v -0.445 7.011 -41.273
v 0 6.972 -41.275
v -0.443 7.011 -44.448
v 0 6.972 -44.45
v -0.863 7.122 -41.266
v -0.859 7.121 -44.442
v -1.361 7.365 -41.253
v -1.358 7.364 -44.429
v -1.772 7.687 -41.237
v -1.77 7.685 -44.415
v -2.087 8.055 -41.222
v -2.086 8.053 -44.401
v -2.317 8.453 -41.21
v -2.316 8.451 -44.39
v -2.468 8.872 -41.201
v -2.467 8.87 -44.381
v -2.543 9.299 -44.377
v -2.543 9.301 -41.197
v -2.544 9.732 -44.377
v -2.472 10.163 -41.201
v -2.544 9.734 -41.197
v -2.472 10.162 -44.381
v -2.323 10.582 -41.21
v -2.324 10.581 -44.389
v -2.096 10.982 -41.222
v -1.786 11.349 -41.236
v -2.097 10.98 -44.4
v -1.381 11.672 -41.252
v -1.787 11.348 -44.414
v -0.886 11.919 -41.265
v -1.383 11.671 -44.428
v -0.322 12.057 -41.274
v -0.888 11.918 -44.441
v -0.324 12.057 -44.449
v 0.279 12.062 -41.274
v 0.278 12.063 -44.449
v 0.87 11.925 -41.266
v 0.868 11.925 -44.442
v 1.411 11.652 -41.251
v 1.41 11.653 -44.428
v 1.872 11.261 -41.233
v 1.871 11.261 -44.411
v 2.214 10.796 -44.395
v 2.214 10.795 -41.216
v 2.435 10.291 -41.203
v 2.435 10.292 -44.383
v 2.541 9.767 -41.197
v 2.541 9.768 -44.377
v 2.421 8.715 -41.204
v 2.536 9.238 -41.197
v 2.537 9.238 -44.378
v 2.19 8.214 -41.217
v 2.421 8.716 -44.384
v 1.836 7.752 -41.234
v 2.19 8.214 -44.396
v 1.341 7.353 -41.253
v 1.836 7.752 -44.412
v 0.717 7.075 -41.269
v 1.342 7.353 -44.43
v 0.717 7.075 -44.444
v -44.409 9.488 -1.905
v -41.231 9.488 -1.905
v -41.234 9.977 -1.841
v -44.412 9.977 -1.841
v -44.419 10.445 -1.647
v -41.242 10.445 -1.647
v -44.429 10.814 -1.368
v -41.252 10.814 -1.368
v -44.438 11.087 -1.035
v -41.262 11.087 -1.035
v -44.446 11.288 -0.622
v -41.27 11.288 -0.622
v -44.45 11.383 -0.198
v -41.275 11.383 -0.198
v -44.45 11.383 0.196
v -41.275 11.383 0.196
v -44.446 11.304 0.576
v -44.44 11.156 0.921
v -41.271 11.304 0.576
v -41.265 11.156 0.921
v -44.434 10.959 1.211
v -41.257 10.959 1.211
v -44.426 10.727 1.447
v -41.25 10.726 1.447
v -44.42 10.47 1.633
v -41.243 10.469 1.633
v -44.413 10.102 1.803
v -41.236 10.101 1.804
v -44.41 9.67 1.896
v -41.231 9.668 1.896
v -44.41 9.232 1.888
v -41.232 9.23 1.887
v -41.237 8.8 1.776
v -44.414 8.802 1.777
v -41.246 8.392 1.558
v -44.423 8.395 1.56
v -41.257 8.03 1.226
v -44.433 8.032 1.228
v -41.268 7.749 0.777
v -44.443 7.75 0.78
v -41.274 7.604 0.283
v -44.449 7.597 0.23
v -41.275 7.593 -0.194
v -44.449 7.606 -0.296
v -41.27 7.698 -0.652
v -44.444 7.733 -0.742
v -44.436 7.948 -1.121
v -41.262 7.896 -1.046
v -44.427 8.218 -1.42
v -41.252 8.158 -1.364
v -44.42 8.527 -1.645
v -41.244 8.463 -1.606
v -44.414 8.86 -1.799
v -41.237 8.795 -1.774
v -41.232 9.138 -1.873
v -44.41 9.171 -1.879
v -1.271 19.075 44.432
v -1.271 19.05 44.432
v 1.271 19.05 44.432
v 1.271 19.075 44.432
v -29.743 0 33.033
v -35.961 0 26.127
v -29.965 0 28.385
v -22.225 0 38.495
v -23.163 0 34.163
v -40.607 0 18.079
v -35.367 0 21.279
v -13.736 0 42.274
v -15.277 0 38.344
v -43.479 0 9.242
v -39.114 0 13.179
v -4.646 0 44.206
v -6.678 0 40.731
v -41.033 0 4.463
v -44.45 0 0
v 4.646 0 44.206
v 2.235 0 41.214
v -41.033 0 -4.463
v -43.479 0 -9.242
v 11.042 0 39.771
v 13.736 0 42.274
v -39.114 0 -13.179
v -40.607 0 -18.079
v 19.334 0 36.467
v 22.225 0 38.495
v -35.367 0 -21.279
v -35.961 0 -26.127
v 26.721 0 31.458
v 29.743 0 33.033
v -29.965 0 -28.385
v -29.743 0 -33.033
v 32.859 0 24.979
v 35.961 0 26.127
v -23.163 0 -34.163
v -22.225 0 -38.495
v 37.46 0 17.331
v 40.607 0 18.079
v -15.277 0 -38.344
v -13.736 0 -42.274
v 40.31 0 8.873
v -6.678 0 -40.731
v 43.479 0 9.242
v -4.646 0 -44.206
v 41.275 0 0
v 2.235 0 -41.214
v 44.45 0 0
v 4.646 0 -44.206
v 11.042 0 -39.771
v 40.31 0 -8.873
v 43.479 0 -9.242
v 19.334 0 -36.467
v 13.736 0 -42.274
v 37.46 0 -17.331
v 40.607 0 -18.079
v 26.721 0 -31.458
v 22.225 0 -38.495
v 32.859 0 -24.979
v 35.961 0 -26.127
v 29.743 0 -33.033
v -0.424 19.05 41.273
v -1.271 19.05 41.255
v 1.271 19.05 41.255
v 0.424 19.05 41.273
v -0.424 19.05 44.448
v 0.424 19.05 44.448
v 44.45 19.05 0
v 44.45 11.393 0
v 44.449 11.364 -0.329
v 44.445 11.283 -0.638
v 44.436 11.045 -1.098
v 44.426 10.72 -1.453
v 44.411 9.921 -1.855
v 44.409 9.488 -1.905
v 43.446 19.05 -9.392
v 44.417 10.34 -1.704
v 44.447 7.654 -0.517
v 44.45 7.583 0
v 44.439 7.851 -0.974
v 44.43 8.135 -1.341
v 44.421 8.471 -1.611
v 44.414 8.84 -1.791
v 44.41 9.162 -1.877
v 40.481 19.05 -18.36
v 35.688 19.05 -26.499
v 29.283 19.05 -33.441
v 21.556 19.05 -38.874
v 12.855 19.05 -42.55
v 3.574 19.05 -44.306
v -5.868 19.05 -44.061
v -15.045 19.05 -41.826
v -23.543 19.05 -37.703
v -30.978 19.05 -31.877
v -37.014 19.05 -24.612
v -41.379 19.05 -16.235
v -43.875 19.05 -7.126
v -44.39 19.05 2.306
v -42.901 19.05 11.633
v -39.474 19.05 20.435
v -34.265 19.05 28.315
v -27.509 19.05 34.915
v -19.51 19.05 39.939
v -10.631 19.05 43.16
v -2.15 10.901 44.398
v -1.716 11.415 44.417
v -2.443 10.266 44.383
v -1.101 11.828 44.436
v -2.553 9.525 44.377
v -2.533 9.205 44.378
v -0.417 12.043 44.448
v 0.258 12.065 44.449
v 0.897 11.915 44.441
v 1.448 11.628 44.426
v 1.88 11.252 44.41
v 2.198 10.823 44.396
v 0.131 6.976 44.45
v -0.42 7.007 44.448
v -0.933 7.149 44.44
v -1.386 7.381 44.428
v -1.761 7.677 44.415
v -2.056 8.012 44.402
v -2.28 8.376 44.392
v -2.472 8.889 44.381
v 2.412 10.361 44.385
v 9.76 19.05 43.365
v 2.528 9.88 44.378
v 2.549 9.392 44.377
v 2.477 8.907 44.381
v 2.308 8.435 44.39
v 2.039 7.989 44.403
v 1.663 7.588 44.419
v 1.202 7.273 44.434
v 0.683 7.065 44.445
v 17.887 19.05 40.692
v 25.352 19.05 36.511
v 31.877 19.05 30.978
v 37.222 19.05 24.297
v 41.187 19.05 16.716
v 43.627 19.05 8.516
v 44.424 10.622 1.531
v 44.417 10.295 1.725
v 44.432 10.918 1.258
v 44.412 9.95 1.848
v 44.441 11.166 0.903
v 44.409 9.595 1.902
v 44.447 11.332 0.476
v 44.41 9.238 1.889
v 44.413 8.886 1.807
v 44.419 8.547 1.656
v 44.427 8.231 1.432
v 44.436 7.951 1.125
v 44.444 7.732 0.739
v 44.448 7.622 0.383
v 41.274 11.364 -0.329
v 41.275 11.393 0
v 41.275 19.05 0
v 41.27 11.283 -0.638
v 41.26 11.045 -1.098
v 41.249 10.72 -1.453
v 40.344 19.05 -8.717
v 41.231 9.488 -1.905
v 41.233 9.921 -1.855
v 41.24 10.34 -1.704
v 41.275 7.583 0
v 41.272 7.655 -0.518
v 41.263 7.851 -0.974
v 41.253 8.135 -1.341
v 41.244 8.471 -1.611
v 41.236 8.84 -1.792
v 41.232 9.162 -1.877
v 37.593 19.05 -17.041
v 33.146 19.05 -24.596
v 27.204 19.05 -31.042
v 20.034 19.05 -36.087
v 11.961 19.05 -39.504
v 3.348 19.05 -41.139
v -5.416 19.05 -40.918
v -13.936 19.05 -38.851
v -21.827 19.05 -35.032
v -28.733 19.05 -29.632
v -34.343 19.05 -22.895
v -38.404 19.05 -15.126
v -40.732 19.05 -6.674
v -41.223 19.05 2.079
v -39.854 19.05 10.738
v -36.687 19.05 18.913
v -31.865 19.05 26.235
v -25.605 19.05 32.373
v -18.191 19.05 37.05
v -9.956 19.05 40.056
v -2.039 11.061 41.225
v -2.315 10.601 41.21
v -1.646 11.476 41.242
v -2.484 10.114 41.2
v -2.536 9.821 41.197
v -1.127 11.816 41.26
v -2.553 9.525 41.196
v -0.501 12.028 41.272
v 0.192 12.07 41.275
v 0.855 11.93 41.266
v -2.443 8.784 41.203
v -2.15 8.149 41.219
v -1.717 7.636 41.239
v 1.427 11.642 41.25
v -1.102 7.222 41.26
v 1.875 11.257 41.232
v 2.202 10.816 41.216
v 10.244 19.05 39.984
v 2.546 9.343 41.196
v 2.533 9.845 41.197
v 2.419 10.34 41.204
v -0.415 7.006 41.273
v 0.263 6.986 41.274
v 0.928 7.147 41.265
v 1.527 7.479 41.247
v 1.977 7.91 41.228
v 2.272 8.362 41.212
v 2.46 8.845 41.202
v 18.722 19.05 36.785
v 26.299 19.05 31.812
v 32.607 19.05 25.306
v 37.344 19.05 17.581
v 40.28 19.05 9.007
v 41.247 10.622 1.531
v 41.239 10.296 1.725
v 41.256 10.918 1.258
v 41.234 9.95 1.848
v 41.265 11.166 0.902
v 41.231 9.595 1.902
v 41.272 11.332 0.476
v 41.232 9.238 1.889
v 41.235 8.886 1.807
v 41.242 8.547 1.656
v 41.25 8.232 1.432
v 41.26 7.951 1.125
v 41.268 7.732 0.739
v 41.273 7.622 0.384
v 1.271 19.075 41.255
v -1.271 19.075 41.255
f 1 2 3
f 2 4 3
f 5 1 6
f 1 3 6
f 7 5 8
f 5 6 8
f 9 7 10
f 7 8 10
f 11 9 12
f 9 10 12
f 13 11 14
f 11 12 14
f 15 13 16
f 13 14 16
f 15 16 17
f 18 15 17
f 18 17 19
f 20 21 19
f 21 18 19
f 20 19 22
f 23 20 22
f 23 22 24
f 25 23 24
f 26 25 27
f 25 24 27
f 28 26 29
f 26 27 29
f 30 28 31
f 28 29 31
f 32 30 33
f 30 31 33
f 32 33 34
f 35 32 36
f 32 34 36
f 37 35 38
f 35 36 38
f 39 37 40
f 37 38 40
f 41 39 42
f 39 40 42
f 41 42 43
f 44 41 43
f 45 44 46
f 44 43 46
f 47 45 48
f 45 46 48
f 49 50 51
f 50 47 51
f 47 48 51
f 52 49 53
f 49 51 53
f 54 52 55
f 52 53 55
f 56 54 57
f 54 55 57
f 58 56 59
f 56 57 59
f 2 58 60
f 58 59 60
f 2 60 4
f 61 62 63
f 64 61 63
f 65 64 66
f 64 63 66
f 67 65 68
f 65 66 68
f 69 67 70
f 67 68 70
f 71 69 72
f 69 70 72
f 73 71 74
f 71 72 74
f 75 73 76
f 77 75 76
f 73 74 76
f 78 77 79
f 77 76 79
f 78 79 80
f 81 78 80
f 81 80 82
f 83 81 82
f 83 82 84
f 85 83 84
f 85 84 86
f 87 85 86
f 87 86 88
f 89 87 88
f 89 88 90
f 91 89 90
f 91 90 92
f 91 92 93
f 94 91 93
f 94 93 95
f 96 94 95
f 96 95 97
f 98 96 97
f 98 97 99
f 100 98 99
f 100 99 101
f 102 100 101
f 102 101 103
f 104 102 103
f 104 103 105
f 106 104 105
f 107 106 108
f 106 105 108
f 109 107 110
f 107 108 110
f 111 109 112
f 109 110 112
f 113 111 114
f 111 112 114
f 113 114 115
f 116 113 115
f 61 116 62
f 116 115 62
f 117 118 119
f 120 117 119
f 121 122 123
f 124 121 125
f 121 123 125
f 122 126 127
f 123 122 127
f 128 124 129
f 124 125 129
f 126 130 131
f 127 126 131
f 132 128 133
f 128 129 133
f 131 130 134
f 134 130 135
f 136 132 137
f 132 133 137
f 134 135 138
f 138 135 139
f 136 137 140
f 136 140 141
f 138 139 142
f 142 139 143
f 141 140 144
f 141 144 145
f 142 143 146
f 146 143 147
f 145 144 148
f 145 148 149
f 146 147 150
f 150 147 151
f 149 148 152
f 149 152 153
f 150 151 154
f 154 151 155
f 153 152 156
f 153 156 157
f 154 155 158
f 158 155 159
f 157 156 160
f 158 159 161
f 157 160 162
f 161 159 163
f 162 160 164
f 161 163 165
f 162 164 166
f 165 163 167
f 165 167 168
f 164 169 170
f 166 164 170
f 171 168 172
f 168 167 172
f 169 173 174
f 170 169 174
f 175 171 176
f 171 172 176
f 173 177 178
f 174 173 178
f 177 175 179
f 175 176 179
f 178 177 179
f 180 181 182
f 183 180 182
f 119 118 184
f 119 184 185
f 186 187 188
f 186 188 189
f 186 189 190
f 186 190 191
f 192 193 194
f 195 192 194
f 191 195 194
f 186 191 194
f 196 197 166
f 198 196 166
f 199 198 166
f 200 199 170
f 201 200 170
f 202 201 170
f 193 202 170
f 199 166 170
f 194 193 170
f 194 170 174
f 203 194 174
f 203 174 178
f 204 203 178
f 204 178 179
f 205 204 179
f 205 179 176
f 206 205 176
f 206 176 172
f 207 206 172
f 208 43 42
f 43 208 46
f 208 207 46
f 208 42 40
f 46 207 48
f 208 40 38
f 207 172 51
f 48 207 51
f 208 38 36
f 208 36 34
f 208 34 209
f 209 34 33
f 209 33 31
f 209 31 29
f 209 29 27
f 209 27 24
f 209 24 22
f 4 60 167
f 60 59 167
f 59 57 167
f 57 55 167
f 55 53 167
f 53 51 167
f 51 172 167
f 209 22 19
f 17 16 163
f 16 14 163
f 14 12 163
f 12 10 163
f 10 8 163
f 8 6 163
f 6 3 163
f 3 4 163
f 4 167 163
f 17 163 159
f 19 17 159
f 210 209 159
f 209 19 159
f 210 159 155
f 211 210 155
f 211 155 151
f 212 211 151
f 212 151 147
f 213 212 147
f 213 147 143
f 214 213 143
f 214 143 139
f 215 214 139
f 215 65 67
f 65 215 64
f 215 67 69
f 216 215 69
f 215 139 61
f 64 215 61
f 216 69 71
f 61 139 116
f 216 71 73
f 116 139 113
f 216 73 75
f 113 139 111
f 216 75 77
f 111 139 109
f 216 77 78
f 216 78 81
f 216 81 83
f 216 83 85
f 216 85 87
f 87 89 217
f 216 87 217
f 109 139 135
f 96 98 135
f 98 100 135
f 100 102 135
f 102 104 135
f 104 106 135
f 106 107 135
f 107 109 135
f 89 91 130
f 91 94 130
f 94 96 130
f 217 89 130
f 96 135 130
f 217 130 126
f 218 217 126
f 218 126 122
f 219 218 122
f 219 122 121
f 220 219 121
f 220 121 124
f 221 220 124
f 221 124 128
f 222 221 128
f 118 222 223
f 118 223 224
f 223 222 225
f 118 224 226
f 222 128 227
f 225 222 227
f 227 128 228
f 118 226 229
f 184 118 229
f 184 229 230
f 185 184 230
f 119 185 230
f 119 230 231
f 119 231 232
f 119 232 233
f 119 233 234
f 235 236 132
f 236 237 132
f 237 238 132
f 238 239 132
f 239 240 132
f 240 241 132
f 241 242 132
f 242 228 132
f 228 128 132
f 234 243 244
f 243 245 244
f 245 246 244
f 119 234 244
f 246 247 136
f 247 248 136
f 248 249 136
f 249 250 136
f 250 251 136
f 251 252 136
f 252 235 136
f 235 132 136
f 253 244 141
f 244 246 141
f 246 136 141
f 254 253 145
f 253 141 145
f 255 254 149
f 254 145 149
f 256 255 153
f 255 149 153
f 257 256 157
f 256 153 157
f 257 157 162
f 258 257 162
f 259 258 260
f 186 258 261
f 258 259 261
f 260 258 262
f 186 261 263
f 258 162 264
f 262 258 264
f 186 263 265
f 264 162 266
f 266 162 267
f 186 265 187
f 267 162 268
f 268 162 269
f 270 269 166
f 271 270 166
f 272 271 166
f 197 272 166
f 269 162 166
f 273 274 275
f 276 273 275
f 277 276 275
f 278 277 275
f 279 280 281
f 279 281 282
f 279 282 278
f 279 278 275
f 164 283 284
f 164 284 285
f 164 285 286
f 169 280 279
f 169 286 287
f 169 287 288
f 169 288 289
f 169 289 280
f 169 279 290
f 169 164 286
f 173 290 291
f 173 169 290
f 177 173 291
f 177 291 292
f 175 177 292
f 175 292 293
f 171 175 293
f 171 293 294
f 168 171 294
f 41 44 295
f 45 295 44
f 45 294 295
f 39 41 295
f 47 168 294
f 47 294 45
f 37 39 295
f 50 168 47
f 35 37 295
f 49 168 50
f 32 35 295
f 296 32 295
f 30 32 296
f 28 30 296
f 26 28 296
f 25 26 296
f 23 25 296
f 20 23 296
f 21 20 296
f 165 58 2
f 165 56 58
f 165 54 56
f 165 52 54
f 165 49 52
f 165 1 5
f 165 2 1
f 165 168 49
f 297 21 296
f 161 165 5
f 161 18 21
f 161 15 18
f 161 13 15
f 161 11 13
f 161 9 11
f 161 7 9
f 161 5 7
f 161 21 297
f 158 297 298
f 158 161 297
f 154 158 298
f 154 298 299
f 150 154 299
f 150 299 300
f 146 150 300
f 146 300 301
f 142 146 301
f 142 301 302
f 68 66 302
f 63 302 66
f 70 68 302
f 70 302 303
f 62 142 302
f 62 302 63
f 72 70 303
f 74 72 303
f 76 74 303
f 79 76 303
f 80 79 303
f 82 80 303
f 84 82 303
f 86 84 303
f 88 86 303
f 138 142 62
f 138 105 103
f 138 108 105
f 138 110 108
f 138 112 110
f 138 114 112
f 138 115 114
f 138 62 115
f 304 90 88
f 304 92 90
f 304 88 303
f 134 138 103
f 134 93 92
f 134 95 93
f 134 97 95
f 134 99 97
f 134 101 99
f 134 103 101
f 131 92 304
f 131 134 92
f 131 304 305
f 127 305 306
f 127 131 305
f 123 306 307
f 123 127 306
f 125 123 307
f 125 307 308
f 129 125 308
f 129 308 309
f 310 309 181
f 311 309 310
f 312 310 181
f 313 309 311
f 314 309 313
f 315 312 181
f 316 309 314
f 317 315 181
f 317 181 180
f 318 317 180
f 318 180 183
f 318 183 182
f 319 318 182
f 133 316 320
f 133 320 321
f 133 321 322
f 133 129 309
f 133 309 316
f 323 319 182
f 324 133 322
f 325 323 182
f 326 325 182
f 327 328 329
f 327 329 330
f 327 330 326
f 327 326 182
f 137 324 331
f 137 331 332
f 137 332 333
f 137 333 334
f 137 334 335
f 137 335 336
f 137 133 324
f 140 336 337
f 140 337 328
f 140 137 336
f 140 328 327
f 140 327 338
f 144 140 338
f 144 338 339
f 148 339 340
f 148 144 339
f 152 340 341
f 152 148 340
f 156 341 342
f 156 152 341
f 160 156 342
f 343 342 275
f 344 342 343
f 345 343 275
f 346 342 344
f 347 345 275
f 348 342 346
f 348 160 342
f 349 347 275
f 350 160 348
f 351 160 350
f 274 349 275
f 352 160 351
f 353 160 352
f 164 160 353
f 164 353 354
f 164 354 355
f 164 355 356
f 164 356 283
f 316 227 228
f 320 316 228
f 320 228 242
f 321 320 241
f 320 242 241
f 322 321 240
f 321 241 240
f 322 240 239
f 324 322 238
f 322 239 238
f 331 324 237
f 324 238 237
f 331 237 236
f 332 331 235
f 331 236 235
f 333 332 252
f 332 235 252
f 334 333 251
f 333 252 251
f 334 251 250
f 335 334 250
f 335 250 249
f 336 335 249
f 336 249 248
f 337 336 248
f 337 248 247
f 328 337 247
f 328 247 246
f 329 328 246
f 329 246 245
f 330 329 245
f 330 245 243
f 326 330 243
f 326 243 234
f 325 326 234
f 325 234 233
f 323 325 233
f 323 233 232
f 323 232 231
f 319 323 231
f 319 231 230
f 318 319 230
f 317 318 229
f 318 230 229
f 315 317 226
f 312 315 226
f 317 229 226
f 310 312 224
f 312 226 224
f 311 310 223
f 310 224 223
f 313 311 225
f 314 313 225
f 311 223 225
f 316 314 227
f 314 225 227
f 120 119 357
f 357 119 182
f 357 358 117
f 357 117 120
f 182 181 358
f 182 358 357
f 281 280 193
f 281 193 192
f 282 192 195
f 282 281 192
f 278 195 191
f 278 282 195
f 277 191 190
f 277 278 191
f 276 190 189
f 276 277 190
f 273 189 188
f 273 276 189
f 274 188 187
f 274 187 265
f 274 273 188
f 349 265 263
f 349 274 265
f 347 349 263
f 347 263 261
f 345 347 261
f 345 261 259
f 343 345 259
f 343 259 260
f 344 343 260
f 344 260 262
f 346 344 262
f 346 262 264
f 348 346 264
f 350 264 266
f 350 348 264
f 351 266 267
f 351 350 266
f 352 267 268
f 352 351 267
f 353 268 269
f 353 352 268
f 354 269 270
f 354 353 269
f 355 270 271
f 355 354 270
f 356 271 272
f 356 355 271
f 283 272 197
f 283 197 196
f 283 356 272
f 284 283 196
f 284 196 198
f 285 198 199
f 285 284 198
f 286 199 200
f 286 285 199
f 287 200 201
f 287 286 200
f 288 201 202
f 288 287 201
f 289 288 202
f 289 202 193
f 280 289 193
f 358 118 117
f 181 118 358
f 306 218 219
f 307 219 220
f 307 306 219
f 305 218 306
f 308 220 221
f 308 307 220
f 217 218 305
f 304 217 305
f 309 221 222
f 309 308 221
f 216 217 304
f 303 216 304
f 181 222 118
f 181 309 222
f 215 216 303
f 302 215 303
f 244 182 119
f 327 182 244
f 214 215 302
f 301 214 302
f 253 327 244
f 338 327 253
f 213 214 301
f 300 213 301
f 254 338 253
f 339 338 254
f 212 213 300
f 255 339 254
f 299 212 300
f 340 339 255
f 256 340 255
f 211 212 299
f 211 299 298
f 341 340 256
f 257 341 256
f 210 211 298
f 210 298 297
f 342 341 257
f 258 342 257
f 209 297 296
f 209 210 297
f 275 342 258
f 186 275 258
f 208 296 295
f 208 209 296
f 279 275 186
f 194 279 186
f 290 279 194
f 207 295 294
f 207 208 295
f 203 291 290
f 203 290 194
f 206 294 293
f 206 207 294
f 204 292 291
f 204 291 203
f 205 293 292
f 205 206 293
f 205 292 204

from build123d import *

# Parameters (mm, degrees)
SKETCH1_R                       = 44.45
SKETCH1_R_2                     = 41.275
BOSS_EXTRUDE1_DEPTH             = 19.05
SKETCH5_W                       = 2.5527
SKETCH5_H                       = 76.2
TAP_DRILL_FOR_1_4_20_TAP2_D     = 5.1054
TAP_DRILL_FOR_1_4_20_TAP2_DEPTH = 76.2
SKETCH10_R                      = 1.905
CUT_EXTRUDE3_DEPTH              = 77.2000001
CUT_EXTRUDE3_DEPTH_BACK         = 13.7000001
TIGWELD_W                       = 2.542332396
TIGWELD_H                       = 3.176399095
BOSS_EXTRUDE2_DEPTH             = 0.0254


with BuildPart() as part:
    # Sketch1 → Boss-Extrude1 (new body)
    with BuildSketch(Plane(origin=(0, 0, 0), x_dir=(1, 0, 0), z_dir=(0, 1, 0))):
        Circle(SKETCH1_R)
        Circle(SKETCH1_R_2, mode=Mode.SUBTRACT)
    extrude(amount=BOSS_EXTRUDE1_DEPTH)

    # Sketch5 → Tap Drill for 1/4-20 Tap1 (revolve, cut)
    with BuildSketch(Plane(origin=(0, 9.525, 31.75), x_dir=(0, -1, 0), z_dir=(1, 0, 0))):
        with Locations((1.27635, 38.1)):
            Rectangle(SKETCH5_W, SKETCH5_H)
    revolve(axis=Axis((0, 9.525, 38.1), (0, 0, -1)), mode=Mode.SUBTRACT)

    # Tap Drill for 1/4-20 Tap2
    with Locations(Plane(origin=(0, 0, -31.75), x_dir=(1, 0, 0), z_dir=(0, 0, -1))):
        with Locations((0, -9.525)):
            Hole(TAP_DRILL_FOR_1_4_20_TAP2_D / 2, depth=TAP_DRILL_FOR_1_4_20_TAP2_DEPTH)

    # Sketch10 → Cut-Extrude3 (cut, two sides)
    with BuildSketch(Plane(origin=(-31.75, 0, 0), x_dir=(0, 0, -1), z_dir=(1, 0, 0))) as cut_extrude3_sk:
        with Locations((0, 9.487883811)):
            Circle(SKETCH10_R)
    extrude(amount=CUT_EXTRUDE3_DEPTH, mode=Mode.SUBTRACT)
    extrude(cut_extrude3_sk.sketch, amount=-CUT_EXTRUDE3_DEPTH_BACK, mode=Mode.SUBTRACT)

    # TigWeld → Boss-Extrude2 (add)
    with BuildSketch(Plane(origin=(0, 19.05, 0), x_dir=(1, 0, 0), z_dir=(0, 1, 0))):
        with Locations((0, -42.843620543)):
            Rectangle(TIGWELD_W, TIGWELD_H)
    extrude(amount=BOSS_EXTRUDE2_DEPTH)


solid = part.part
